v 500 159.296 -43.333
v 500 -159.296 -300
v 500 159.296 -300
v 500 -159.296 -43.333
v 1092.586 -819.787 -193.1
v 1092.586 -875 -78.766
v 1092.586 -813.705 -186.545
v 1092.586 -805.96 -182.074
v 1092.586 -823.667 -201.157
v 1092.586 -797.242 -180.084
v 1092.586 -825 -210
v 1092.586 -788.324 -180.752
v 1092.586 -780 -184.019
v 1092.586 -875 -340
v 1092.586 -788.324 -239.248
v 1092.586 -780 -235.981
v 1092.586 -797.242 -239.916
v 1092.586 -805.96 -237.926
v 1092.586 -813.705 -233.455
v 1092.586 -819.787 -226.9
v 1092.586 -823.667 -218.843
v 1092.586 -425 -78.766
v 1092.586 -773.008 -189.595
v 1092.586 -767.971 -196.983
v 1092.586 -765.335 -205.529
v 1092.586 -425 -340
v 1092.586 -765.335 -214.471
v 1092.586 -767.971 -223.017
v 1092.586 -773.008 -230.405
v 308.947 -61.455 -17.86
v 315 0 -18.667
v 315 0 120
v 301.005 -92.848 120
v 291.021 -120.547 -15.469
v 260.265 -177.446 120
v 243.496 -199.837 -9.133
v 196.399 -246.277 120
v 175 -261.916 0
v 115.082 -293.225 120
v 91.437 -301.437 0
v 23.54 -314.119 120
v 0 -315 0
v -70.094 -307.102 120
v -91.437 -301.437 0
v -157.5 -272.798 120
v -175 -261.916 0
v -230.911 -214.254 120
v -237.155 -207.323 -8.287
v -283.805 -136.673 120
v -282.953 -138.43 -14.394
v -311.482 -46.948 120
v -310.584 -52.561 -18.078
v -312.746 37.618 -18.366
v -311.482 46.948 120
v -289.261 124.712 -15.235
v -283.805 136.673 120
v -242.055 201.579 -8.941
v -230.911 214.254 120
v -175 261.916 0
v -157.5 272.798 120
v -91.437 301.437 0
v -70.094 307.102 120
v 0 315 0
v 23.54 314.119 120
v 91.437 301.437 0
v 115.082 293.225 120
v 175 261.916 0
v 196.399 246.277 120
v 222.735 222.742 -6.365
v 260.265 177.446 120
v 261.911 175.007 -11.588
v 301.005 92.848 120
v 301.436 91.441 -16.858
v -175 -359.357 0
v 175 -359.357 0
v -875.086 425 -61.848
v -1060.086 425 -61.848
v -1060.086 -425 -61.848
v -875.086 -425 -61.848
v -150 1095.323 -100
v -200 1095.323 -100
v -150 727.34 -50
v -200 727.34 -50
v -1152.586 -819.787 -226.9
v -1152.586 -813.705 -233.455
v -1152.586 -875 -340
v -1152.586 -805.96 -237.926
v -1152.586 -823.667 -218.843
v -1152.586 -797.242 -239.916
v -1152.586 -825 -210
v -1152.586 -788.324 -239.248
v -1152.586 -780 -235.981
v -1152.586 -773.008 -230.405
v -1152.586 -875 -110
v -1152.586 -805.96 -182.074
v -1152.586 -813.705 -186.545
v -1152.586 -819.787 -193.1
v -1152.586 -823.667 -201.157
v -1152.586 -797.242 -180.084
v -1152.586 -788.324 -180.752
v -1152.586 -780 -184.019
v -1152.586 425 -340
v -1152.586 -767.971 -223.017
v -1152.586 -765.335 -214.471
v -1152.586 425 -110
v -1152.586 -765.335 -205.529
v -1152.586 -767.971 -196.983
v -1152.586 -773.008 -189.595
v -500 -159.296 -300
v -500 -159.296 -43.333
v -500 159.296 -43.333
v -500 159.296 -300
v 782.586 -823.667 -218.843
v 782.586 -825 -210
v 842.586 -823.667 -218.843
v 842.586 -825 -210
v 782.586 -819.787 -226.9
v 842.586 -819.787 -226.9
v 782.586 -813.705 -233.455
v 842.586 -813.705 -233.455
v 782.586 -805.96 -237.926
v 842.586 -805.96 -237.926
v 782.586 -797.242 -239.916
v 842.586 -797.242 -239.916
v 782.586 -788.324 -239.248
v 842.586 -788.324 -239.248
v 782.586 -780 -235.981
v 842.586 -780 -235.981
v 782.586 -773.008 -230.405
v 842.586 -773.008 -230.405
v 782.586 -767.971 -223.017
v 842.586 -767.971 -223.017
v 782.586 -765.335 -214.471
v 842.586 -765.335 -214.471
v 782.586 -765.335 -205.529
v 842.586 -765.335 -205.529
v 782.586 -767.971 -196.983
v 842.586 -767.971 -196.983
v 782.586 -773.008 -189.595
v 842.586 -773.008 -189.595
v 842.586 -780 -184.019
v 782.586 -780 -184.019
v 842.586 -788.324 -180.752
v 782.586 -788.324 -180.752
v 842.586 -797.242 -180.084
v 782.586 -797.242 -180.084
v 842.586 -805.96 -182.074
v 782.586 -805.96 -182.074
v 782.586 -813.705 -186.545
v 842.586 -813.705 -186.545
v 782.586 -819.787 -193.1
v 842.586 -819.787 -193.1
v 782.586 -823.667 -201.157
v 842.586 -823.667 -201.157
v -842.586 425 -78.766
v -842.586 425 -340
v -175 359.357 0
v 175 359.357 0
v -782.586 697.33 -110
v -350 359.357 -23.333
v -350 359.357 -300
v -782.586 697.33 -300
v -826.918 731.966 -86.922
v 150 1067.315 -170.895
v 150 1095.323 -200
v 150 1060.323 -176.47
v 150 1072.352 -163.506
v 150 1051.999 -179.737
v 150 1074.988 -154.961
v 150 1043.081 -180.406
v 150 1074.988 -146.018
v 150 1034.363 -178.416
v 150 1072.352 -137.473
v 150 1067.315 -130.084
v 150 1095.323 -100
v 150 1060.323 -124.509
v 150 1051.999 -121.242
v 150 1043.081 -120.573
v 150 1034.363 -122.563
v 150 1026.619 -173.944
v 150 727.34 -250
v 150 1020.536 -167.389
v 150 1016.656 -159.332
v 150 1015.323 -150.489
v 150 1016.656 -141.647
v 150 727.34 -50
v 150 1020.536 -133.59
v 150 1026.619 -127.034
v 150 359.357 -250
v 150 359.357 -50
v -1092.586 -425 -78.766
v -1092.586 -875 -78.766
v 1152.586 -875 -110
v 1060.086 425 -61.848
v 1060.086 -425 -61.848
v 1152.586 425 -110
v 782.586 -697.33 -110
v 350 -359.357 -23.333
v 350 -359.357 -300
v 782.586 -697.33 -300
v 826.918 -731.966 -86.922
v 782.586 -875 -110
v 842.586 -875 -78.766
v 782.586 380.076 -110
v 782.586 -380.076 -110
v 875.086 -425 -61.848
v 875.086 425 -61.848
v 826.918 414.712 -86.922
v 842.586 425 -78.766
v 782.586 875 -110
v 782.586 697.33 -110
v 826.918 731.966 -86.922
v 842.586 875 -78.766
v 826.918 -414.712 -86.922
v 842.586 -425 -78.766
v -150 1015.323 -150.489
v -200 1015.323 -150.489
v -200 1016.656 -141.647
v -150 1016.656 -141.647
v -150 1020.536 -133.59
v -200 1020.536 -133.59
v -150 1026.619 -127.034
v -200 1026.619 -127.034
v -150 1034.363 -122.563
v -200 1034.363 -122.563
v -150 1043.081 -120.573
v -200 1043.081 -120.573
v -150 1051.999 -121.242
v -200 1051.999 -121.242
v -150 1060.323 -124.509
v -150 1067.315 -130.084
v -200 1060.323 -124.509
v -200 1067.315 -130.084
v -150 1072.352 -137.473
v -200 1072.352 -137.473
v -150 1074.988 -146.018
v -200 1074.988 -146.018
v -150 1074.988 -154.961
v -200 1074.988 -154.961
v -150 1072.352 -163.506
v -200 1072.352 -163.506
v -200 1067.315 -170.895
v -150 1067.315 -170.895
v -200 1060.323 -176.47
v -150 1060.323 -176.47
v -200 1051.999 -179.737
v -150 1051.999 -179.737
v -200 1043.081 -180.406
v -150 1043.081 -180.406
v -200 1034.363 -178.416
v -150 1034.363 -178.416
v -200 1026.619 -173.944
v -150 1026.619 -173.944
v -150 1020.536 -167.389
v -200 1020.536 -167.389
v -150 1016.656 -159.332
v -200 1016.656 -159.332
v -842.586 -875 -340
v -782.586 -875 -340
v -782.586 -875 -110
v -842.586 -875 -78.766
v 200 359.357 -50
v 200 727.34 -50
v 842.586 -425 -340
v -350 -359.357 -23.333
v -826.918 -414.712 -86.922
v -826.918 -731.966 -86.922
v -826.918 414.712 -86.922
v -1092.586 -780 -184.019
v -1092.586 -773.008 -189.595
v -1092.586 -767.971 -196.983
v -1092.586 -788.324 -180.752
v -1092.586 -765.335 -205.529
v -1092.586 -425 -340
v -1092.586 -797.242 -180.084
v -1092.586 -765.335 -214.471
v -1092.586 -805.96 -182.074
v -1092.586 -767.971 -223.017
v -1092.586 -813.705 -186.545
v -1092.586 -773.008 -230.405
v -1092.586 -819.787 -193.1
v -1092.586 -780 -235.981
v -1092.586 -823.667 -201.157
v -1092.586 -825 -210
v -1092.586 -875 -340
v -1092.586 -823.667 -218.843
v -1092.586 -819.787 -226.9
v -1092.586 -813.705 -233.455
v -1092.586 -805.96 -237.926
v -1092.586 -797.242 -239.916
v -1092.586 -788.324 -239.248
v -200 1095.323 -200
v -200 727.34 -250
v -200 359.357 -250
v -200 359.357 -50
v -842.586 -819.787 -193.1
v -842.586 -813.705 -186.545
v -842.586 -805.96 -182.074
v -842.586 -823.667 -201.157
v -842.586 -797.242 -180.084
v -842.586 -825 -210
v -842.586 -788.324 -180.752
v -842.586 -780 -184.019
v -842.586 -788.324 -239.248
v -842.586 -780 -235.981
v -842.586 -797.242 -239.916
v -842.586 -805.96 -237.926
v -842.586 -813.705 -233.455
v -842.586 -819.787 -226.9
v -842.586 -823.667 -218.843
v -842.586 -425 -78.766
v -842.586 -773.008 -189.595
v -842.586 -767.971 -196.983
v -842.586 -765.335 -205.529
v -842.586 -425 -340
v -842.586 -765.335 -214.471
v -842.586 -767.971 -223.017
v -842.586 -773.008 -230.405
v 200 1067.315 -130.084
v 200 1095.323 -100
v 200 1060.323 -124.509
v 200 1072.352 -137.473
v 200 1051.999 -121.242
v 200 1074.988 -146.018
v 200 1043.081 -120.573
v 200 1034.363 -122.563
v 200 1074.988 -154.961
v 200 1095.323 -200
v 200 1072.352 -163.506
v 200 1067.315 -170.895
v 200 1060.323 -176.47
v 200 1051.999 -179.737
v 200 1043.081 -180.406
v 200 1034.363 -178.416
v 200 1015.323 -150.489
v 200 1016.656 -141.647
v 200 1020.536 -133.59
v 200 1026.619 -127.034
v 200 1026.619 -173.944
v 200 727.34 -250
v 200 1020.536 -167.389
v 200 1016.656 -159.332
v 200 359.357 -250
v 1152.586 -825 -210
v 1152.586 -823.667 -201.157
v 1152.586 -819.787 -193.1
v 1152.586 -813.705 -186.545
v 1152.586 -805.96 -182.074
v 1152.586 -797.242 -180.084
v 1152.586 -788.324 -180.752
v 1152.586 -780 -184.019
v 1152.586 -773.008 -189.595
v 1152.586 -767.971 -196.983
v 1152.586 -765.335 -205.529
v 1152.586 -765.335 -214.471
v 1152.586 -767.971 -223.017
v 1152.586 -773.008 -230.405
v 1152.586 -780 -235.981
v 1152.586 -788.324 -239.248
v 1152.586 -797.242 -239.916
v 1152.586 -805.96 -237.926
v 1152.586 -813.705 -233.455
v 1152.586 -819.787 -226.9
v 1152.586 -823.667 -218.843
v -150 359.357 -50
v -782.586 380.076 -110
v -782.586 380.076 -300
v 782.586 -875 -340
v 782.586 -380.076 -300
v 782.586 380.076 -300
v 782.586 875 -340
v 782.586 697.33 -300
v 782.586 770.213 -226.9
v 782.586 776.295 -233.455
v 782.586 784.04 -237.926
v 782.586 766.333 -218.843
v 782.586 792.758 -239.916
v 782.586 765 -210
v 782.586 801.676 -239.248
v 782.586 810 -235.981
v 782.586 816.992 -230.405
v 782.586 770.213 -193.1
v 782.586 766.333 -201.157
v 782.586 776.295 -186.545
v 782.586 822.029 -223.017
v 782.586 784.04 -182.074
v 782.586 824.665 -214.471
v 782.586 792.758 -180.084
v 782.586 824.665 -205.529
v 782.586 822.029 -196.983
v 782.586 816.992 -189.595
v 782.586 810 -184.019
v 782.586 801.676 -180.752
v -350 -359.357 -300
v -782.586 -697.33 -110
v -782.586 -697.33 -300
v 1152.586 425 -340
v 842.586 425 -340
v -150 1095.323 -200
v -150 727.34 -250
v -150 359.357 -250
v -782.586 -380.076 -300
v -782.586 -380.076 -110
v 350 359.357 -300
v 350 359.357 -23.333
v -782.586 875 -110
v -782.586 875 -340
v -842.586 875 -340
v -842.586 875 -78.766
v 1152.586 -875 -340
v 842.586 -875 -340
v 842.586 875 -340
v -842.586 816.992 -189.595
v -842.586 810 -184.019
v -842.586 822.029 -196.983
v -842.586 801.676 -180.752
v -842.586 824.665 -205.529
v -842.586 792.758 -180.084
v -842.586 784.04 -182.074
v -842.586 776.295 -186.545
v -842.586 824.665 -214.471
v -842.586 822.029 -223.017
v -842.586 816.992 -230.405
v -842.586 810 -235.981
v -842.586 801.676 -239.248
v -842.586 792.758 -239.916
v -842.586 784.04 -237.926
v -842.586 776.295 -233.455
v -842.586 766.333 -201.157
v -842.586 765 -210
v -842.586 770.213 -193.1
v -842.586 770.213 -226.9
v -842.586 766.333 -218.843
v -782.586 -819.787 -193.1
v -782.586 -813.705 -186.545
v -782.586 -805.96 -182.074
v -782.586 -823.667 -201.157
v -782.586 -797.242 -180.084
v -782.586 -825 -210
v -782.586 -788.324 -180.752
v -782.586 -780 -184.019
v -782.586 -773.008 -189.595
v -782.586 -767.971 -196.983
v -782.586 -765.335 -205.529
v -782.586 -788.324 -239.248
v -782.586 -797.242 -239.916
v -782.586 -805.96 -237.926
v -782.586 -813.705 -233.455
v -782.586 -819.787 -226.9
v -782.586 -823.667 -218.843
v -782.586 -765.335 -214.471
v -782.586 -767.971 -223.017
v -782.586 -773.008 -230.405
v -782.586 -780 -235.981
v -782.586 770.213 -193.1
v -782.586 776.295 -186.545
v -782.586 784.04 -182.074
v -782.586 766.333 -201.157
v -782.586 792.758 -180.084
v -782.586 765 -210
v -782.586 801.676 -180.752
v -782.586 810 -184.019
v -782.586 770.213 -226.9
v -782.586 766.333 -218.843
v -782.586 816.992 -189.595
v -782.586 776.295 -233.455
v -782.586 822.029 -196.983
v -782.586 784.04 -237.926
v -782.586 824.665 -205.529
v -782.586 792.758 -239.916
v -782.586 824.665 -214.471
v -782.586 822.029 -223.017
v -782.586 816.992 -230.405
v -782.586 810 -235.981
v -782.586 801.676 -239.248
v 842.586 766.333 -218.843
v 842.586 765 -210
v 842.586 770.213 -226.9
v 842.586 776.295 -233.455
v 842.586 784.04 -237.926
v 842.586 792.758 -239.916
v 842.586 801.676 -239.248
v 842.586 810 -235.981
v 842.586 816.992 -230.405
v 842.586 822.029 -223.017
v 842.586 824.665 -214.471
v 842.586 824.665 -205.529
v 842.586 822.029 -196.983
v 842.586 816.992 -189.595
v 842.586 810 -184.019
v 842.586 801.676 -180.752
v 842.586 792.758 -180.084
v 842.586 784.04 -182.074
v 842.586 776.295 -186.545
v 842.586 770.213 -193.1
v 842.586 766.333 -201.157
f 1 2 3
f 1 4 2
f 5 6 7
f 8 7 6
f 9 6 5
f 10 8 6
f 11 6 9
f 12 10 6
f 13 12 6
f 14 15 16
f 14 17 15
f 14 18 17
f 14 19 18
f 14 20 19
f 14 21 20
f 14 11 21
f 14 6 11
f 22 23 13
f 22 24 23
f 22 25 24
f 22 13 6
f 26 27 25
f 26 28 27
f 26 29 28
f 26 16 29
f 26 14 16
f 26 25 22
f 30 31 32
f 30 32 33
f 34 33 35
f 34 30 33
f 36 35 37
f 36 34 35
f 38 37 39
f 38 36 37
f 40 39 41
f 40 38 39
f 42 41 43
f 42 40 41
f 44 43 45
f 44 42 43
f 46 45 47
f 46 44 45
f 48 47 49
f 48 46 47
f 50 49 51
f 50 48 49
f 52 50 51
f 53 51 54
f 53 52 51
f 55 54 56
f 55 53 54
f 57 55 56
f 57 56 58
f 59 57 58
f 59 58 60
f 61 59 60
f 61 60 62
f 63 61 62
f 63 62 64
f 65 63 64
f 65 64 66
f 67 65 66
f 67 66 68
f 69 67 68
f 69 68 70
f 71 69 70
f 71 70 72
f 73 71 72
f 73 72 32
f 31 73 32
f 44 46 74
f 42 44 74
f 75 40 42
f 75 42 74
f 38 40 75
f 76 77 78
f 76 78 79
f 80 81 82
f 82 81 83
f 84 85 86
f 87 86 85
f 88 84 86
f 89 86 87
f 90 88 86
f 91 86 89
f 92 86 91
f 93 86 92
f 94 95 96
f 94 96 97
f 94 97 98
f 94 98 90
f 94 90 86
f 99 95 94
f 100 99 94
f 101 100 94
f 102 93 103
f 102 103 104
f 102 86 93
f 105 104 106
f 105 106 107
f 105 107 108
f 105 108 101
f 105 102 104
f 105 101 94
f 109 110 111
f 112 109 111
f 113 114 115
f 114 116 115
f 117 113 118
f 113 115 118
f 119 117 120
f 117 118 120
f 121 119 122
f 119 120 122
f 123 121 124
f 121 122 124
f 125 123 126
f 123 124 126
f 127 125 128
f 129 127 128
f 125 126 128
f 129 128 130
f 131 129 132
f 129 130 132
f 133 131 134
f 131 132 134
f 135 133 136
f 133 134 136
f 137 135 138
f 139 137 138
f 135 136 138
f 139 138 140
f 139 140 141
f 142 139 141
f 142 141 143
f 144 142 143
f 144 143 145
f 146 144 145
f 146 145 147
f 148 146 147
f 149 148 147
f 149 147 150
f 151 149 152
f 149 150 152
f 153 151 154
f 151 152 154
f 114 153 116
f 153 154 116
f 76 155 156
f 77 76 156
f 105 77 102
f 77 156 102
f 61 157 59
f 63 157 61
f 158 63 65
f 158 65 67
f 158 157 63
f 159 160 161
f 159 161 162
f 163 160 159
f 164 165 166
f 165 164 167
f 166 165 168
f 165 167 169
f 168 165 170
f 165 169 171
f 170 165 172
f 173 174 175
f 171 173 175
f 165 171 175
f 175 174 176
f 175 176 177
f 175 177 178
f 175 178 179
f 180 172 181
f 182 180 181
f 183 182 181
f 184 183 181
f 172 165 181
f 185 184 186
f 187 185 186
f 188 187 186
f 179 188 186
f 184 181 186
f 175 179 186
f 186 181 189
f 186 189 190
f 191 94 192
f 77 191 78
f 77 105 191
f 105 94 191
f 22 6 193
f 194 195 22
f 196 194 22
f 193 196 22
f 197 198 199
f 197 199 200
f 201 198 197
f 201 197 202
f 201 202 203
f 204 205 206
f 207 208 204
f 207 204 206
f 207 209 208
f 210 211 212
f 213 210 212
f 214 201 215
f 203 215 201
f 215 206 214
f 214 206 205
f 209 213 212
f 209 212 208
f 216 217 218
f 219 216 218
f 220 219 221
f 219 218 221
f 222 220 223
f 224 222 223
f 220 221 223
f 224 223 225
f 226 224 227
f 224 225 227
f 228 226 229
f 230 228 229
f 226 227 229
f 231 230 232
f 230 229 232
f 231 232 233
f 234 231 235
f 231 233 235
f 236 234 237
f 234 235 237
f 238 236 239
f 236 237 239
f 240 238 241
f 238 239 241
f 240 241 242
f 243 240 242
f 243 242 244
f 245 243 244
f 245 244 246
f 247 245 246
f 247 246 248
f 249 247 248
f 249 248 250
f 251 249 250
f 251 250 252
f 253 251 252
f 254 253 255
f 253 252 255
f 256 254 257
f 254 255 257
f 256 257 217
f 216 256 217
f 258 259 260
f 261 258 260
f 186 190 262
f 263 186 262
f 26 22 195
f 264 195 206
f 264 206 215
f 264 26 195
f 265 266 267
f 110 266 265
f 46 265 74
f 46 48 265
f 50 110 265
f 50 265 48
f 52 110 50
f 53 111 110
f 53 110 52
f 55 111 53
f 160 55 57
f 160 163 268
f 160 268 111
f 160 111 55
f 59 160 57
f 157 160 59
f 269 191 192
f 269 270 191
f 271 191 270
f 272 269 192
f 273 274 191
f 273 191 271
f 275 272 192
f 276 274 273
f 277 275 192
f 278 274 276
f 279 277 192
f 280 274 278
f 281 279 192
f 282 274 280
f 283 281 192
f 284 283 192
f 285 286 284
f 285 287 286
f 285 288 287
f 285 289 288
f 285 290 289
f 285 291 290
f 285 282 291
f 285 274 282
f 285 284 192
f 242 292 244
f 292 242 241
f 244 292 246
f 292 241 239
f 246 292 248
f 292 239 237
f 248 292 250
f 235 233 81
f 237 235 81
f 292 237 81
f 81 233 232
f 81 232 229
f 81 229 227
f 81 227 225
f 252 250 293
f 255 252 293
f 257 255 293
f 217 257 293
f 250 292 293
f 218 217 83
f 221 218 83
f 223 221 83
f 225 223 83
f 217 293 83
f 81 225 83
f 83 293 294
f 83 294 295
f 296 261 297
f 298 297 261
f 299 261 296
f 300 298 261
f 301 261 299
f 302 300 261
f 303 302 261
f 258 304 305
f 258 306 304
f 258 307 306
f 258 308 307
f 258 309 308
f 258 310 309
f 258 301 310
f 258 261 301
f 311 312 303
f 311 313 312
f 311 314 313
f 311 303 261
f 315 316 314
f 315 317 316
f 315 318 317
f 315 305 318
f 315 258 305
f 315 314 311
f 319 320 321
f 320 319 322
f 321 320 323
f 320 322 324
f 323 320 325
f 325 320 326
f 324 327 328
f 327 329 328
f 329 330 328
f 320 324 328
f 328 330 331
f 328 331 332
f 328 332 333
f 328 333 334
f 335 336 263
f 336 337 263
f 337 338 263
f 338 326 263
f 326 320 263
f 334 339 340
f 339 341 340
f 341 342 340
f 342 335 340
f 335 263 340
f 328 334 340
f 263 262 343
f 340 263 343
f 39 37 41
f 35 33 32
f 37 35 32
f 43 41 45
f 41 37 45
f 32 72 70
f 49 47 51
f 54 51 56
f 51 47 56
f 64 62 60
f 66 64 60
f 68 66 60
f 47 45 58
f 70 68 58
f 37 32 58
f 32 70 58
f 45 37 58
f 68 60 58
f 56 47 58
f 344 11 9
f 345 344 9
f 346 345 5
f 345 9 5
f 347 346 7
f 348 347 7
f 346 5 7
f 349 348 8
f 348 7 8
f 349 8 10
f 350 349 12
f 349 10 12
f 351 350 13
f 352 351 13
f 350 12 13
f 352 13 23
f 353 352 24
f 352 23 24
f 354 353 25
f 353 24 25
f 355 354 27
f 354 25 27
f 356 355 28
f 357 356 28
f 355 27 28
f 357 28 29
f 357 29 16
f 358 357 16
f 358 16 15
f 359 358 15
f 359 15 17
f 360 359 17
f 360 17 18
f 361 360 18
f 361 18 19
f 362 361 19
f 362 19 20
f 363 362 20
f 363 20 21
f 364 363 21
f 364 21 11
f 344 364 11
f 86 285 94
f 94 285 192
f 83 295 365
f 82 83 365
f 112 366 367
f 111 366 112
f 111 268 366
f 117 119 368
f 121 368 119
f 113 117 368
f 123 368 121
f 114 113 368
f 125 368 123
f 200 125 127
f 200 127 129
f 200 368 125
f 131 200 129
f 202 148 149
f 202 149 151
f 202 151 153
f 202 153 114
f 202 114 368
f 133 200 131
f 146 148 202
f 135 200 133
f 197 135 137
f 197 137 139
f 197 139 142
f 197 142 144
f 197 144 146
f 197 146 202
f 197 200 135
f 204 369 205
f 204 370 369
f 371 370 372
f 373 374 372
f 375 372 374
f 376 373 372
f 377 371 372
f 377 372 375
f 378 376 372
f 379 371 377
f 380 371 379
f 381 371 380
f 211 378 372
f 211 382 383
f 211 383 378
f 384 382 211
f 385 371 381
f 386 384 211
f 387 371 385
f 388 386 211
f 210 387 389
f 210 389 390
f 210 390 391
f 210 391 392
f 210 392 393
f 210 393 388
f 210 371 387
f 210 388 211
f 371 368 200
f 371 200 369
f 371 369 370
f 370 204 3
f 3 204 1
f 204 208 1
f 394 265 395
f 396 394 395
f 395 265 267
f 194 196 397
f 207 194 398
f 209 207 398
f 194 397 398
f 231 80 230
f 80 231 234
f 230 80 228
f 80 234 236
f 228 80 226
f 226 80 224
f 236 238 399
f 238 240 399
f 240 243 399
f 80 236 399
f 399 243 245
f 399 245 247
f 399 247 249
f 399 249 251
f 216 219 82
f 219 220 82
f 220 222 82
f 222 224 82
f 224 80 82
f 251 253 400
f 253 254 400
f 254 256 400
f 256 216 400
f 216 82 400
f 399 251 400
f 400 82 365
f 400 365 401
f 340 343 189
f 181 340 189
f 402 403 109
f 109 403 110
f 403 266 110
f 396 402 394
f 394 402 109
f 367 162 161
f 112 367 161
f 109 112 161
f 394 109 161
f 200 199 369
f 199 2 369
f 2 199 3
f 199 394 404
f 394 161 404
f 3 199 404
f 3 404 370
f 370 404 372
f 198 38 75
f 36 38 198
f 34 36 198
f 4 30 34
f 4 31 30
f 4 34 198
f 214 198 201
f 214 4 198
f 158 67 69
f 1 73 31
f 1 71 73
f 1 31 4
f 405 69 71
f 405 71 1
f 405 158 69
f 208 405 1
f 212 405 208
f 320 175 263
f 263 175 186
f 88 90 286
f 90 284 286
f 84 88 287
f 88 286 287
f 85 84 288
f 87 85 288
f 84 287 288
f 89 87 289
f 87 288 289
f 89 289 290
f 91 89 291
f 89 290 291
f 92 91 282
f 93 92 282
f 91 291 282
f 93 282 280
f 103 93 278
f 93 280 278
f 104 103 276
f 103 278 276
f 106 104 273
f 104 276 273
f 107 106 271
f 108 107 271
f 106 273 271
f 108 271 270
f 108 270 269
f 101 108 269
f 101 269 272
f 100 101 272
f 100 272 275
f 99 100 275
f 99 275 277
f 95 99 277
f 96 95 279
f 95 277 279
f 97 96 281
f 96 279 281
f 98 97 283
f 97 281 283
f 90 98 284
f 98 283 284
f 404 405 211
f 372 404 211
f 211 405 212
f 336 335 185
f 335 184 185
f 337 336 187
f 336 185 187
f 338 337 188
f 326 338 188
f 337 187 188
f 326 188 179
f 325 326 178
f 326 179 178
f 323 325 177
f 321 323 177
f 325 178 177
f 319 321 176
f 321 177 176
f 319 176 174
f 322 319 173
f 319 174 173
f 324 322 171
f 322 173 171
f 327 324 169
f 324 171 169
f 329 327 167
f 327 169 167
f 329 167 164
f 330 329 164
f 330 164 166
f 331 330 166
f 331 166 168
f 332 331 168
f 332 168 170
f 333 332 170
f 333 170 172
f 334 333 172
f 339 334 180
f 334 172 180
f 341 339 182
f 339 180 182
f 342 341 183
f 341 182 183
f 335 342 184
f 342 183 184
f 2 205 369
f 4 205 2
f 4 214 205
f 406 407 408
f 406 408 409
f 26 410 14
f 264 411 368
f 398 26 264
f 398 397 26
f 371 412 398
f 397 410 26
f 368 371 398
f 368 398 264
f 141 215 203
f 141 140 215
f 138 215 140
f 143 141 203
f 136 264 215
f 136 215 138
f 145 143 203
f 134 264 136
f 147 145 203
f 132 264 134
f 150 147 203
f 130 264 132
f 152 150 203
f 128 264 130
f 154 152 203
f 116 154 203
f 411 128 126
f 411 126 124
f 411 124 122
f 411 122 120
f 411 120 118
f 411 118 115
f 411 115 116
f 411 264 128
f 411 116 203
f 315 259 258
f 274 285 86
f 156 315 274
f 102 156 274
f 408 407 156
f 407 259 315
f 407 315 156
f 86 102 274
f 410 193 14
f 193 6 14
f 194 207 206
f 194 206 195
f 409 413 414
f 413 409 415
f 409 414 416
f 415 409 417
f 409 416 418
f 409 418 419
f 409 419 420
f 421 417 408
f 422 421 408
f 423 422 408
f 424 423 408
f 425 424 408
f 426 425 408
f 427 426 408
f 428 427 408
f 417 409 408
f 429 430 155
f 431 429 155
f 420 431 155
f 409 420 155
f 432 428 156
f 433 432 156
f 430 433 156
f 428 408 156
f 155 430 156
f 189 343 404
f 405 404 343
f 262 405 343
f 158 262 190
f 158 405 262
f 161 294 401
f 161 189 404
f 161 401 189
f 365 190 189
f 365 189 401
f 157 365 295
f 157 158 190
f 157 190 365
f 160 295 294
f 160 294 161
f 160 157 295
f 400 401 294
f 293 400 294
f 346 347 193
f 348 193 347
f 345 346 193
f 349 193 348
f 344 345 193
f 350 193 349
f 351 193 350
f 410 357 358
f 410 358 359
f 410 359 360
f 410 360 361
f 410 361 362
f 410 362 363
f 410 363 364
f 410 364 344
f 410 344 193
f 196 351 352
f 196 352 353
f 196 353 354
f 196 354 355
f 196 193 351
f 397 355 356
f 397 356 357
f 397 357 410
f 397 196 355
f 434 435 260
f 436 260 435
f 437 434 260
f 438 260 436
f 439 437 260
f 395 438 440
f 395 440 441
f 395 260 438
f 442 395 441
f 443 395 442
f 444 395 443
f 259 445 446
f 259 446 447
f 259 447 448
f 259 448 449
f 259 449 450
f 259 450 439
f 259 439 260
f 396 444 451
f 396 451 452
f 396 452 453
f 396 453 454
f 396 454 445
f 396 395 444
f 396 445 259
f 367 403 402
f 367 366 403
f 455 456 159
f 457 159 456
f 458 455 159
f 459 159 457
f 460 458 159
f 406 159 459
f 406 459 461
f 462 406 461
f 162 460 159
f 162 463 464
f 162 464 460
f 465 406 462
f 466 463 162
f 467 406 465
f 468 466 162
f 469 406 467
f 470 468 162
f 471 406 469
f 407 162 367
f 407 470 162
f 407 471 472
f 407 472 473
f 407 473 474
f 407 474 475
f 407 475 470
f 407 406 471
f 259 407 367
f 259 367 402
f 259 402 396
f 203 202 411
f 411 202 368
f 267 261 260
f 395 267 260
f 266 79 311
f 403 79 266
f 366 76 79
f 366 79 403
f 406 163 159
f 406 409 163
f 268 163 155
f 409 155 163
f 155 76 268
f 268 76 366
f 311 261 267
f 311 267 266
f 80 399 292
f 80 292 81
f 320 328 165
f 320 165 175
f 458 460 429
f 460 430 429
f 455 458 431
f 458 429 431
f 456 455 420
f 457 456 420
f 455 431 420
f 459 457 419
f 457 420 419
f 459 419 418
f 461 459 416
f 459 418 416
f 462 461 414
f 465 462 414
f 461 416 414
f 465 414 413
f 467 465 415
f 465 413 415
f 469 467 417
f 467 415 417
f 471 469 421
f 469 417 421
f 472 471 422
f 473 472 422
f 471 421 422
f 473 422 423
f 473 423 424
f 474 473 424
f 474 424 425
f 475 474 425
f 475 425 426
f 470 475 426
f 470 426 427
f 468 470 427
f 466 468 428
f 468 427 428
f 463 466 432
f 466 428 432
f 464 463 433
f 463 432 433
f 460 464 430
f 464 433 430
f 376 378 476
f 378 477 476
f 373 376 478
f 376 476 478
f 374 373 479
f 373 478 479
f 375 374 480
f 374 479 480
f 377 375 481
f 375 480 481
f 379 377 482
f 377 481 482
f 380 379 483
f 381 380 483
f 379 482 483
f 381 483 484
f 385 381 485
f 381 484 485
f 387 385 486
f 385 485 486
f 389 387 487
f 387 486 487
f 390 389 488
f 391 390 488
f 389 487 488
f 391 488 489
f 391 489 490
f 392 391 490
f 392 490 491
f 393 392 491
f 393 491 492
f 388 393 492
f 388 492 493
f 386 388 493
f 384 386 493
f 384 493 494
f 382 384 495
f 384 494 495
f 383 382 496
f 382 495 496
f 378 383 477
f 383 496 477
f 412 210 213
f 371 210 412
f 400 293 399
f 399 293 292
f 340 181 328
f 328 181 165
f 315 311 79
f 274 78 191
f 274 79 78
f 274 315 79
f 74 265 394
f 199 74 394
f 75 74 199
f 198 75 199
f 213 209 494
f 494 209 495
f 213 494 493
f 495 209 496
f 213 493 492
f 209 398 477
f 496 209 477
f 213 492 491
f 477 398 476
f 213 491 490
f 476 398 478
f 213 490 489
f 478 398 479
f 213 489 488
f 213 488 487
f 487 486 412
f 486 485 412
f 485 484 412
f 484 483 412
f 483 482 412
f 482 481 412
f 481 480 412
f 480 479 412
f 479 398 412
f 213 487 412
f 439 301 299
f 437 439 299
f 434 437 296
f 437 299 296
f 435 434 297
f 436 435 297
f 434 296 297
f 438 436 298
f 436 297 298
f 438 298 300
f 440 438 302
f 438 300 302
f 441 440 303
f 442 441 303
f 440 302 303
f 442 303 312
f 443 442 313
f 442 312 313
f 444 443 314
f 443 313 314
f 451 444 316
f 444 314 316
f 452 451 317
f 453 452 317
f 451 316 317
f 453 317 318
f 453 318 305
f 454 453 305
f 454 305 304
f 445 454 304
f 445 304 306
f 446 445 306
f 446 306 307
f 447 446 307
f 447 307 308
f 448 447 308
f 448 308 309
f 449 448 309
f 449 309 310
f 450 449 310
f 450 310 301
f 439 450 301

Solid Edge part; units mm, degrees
sketch "Sketch1" plane through (0, 0, 0) normal (0, 0, 1) x (1, 0, 0)
  line L0 (0, -359.3572) -> (350, -359.3572)
  line L1 (350, -359.3572) -> (850, -750)
  line L2 (850, -750) -> (850, -432.7454)
  line L3 (850, -432.7454) -> (500, -159.2955)
  line L4 (500, -159.2955) -> (500, 0)
  line L5 (500, 159.2955) -> (500, 0)
  line L6 (850, 432.7454) -> (500, 159.2955)
  line L7 (850, 750) -> (850, 432.7454)
  line L8 (350, 359.3572) -> (850, 750)
  line L9 (0, 359.3572) -> (350, 359.3572)
  line L10 (0, 359.3572) -> (-350, 359.3572)
  line L11 (-350, 359.3572) -> (-850, 750)
  line L12 (-850, 750) -> (-850, 432.7454)
  line L13 (-850, 432.7454) -> (-500, 159.2955)
  line L14 (-500, 159.2955) -> (-500, 0)
  line L15 (-500, -159.2955) -> (-500, 0)
  line L16 (-850, -432.7454) -> (-500, -159.2955)
  line L17 (-850, -750) -> (-850, -432.7454)
  line L18 (-350, -359.3572) -> (-850, -750)
  line L19 (0, -359.3572) -> (-350, -359.3572)
  dimension "D1" = 350
  dimension "D2" = 250
  dimension "D3" = 500
  dimension "D4" = 850
  dimension "D5" = 750
extrude "Protrusion1" add sketch "Sketch1" against normal blind 300
sketch "Sketch2" plane through (0, 0, 0) normal (0, -1, 0) x (1, 0, 0)
  line L0 (850, -90) -> (175, 0)
  line L1 (175, 0) -> (850, 0)
  line L2 (850, 0) -> (850, -90)
  line L3 (-175, 0) -> (-850, -90)
  line L4 (-850, -90) -> (-850, 0)
  line L5 (-850, 0) -> (-175, 0)
  dimension "D1" = 90
extrude "Cutout1" cut sketch "Sketch2" against normal through all
mirror "Mirror1" about plane through (0, 0, 0) normal (0, -1, 0) of "Cutout1"
sketch "Sketch3" plane through (0, 0, -300) normal (0, 0, -1) x (1, 0, 0)
  circle A0 centre (0, 0) radius 315
extrude "Protrusion2" add sketch "Sketch3" against normal blind 420
sketch "Sketch4" plane through (0, 0, 0) normal (0, -1, 0) x (1, 0, 0)
  line L0 (-782.586, -110) -> (-782.586, -340)
  line L1 (-782.586, -340) -> (-1152.586, -340)
  line L2 (-1152.586, -340) -> (-1152.586, -110)
  line L3 (-1152.586, -110) -> (-1060.086, -61.8475)
  line L4 (-1060.086, -61.8475) -> (-875.086, -61.8475)
  line L5 (-875.086, -61.8475) -> (-782.586, -110)
  dimension "D1" = 230
  dimension "D2" = 370
  dimension "D3" = 40
extrude "ExtrudedProtrusion_3" add sketch "Sketch4" along normal mid plane 1750
sketch "Sketch5" plane through (-967.586, 0, -340) normal (0, 0, -1) x (1, 0, 0)
  line L0 (-125, 875) -> (125, 875)
  line L1 (125, 875) -> (125, 425)
  line L2 (125, 425) -> (-125, 425)
  line L3 (-125, 425) -> (-125, 875)
  dimension "D1" = 450
  dimension "D2" = 250
  dimension "D3" = 60
extrude "Cutout3" cut sketch "Sketch5" against normal through all
sketch "Sketch6" plane through (-967.586, 0, -340) normal (0, 0, -1) x (-1, 0, 0)
  line L0 (185, 875) -> (-125, 875)
  line L1 (-125, 875) -> (-125, 425)
  line L2 (-125, 425) -> (185, 425)
  line L3 (185, 425) -> (185, 875)
  dimension "D1" = 450
  dimension "D2" = 310
  dimension "D3" = 60
extrude "Cutout4" cut sketch "Sketch6" against normal through all
sketch "Sketch7" plane through (-842.586, 725, -209.383) normal (-1, 0, 0) x (0, -1, 0)
  circle A0 centre (1520, -0.617) radius 30
  circle A1 centre (-70, -0.617) radius 30
  dimension "D1" = 60
  dimension "D2" = 80
  dimension "D3" = 130
  dimension "D4" = 130
  dimension "D5" = 80
  dimension "D6" = 60
extrude "ExtrudedCutout_8" cut sketch "Sketch7" along normal mid plane 1000
mirror "Mirror2" about plane through (0, 0, 0) normal (1, 0, 0) of "ExtrudedProtrusion_3", "Cutout3", "Cutout4", "ExtrudedCutout_8"
sketch "Sketch8" plane through (0, 359.3572, -150) normal (0, 1, 0) x (-1, 0, 0)
  line L0 (-200, 100) -> (-200, -100)
  line L1 (-200, -100) -> (-150, -100)
  line L2 (-150, -100) -> (-150, 100)
  line L3 (-150, 100) -> (-200, 100)
  line L4 (150, -100) -> (200, -100)
  line L5 (200, -100) -> (200, 100)
  line L6 (200, 100) -> (150, 100)
  line L7 (150, 100) -> (150, -100)
extrude "Protrusion4" add sketch "Sketch8" along normal blind 735.9662
sketch "Sketch9" plane through (-200, 727.3403, -150) normal (-1, 0, 0) x (0, -1, 0)
  line L0 (0, -100) -> (-367.9831, -50)
  line L1 (-367.9831, -50) -> (-367.9831, -100)
  line L2 (-367.9831, -100) -> (0, -100)
  line L3 (-367.9831, 50) -> (0, 100)
  line L4 (0, 100) -> (-367.9831, 100)
  line L5 (-367.9831, 100) -> (-367.9831, 50)
  circle A0 centre (-317.9831, -0.4894) radius 30
  dimension "D1" = 50
  dimension "D2" = 367.9831
  dimension "D3" = 50
  dimension "D4" = 60
extrude "ExtrudedCutout_15" cut sketch "Sketch9" against normal blind 400
